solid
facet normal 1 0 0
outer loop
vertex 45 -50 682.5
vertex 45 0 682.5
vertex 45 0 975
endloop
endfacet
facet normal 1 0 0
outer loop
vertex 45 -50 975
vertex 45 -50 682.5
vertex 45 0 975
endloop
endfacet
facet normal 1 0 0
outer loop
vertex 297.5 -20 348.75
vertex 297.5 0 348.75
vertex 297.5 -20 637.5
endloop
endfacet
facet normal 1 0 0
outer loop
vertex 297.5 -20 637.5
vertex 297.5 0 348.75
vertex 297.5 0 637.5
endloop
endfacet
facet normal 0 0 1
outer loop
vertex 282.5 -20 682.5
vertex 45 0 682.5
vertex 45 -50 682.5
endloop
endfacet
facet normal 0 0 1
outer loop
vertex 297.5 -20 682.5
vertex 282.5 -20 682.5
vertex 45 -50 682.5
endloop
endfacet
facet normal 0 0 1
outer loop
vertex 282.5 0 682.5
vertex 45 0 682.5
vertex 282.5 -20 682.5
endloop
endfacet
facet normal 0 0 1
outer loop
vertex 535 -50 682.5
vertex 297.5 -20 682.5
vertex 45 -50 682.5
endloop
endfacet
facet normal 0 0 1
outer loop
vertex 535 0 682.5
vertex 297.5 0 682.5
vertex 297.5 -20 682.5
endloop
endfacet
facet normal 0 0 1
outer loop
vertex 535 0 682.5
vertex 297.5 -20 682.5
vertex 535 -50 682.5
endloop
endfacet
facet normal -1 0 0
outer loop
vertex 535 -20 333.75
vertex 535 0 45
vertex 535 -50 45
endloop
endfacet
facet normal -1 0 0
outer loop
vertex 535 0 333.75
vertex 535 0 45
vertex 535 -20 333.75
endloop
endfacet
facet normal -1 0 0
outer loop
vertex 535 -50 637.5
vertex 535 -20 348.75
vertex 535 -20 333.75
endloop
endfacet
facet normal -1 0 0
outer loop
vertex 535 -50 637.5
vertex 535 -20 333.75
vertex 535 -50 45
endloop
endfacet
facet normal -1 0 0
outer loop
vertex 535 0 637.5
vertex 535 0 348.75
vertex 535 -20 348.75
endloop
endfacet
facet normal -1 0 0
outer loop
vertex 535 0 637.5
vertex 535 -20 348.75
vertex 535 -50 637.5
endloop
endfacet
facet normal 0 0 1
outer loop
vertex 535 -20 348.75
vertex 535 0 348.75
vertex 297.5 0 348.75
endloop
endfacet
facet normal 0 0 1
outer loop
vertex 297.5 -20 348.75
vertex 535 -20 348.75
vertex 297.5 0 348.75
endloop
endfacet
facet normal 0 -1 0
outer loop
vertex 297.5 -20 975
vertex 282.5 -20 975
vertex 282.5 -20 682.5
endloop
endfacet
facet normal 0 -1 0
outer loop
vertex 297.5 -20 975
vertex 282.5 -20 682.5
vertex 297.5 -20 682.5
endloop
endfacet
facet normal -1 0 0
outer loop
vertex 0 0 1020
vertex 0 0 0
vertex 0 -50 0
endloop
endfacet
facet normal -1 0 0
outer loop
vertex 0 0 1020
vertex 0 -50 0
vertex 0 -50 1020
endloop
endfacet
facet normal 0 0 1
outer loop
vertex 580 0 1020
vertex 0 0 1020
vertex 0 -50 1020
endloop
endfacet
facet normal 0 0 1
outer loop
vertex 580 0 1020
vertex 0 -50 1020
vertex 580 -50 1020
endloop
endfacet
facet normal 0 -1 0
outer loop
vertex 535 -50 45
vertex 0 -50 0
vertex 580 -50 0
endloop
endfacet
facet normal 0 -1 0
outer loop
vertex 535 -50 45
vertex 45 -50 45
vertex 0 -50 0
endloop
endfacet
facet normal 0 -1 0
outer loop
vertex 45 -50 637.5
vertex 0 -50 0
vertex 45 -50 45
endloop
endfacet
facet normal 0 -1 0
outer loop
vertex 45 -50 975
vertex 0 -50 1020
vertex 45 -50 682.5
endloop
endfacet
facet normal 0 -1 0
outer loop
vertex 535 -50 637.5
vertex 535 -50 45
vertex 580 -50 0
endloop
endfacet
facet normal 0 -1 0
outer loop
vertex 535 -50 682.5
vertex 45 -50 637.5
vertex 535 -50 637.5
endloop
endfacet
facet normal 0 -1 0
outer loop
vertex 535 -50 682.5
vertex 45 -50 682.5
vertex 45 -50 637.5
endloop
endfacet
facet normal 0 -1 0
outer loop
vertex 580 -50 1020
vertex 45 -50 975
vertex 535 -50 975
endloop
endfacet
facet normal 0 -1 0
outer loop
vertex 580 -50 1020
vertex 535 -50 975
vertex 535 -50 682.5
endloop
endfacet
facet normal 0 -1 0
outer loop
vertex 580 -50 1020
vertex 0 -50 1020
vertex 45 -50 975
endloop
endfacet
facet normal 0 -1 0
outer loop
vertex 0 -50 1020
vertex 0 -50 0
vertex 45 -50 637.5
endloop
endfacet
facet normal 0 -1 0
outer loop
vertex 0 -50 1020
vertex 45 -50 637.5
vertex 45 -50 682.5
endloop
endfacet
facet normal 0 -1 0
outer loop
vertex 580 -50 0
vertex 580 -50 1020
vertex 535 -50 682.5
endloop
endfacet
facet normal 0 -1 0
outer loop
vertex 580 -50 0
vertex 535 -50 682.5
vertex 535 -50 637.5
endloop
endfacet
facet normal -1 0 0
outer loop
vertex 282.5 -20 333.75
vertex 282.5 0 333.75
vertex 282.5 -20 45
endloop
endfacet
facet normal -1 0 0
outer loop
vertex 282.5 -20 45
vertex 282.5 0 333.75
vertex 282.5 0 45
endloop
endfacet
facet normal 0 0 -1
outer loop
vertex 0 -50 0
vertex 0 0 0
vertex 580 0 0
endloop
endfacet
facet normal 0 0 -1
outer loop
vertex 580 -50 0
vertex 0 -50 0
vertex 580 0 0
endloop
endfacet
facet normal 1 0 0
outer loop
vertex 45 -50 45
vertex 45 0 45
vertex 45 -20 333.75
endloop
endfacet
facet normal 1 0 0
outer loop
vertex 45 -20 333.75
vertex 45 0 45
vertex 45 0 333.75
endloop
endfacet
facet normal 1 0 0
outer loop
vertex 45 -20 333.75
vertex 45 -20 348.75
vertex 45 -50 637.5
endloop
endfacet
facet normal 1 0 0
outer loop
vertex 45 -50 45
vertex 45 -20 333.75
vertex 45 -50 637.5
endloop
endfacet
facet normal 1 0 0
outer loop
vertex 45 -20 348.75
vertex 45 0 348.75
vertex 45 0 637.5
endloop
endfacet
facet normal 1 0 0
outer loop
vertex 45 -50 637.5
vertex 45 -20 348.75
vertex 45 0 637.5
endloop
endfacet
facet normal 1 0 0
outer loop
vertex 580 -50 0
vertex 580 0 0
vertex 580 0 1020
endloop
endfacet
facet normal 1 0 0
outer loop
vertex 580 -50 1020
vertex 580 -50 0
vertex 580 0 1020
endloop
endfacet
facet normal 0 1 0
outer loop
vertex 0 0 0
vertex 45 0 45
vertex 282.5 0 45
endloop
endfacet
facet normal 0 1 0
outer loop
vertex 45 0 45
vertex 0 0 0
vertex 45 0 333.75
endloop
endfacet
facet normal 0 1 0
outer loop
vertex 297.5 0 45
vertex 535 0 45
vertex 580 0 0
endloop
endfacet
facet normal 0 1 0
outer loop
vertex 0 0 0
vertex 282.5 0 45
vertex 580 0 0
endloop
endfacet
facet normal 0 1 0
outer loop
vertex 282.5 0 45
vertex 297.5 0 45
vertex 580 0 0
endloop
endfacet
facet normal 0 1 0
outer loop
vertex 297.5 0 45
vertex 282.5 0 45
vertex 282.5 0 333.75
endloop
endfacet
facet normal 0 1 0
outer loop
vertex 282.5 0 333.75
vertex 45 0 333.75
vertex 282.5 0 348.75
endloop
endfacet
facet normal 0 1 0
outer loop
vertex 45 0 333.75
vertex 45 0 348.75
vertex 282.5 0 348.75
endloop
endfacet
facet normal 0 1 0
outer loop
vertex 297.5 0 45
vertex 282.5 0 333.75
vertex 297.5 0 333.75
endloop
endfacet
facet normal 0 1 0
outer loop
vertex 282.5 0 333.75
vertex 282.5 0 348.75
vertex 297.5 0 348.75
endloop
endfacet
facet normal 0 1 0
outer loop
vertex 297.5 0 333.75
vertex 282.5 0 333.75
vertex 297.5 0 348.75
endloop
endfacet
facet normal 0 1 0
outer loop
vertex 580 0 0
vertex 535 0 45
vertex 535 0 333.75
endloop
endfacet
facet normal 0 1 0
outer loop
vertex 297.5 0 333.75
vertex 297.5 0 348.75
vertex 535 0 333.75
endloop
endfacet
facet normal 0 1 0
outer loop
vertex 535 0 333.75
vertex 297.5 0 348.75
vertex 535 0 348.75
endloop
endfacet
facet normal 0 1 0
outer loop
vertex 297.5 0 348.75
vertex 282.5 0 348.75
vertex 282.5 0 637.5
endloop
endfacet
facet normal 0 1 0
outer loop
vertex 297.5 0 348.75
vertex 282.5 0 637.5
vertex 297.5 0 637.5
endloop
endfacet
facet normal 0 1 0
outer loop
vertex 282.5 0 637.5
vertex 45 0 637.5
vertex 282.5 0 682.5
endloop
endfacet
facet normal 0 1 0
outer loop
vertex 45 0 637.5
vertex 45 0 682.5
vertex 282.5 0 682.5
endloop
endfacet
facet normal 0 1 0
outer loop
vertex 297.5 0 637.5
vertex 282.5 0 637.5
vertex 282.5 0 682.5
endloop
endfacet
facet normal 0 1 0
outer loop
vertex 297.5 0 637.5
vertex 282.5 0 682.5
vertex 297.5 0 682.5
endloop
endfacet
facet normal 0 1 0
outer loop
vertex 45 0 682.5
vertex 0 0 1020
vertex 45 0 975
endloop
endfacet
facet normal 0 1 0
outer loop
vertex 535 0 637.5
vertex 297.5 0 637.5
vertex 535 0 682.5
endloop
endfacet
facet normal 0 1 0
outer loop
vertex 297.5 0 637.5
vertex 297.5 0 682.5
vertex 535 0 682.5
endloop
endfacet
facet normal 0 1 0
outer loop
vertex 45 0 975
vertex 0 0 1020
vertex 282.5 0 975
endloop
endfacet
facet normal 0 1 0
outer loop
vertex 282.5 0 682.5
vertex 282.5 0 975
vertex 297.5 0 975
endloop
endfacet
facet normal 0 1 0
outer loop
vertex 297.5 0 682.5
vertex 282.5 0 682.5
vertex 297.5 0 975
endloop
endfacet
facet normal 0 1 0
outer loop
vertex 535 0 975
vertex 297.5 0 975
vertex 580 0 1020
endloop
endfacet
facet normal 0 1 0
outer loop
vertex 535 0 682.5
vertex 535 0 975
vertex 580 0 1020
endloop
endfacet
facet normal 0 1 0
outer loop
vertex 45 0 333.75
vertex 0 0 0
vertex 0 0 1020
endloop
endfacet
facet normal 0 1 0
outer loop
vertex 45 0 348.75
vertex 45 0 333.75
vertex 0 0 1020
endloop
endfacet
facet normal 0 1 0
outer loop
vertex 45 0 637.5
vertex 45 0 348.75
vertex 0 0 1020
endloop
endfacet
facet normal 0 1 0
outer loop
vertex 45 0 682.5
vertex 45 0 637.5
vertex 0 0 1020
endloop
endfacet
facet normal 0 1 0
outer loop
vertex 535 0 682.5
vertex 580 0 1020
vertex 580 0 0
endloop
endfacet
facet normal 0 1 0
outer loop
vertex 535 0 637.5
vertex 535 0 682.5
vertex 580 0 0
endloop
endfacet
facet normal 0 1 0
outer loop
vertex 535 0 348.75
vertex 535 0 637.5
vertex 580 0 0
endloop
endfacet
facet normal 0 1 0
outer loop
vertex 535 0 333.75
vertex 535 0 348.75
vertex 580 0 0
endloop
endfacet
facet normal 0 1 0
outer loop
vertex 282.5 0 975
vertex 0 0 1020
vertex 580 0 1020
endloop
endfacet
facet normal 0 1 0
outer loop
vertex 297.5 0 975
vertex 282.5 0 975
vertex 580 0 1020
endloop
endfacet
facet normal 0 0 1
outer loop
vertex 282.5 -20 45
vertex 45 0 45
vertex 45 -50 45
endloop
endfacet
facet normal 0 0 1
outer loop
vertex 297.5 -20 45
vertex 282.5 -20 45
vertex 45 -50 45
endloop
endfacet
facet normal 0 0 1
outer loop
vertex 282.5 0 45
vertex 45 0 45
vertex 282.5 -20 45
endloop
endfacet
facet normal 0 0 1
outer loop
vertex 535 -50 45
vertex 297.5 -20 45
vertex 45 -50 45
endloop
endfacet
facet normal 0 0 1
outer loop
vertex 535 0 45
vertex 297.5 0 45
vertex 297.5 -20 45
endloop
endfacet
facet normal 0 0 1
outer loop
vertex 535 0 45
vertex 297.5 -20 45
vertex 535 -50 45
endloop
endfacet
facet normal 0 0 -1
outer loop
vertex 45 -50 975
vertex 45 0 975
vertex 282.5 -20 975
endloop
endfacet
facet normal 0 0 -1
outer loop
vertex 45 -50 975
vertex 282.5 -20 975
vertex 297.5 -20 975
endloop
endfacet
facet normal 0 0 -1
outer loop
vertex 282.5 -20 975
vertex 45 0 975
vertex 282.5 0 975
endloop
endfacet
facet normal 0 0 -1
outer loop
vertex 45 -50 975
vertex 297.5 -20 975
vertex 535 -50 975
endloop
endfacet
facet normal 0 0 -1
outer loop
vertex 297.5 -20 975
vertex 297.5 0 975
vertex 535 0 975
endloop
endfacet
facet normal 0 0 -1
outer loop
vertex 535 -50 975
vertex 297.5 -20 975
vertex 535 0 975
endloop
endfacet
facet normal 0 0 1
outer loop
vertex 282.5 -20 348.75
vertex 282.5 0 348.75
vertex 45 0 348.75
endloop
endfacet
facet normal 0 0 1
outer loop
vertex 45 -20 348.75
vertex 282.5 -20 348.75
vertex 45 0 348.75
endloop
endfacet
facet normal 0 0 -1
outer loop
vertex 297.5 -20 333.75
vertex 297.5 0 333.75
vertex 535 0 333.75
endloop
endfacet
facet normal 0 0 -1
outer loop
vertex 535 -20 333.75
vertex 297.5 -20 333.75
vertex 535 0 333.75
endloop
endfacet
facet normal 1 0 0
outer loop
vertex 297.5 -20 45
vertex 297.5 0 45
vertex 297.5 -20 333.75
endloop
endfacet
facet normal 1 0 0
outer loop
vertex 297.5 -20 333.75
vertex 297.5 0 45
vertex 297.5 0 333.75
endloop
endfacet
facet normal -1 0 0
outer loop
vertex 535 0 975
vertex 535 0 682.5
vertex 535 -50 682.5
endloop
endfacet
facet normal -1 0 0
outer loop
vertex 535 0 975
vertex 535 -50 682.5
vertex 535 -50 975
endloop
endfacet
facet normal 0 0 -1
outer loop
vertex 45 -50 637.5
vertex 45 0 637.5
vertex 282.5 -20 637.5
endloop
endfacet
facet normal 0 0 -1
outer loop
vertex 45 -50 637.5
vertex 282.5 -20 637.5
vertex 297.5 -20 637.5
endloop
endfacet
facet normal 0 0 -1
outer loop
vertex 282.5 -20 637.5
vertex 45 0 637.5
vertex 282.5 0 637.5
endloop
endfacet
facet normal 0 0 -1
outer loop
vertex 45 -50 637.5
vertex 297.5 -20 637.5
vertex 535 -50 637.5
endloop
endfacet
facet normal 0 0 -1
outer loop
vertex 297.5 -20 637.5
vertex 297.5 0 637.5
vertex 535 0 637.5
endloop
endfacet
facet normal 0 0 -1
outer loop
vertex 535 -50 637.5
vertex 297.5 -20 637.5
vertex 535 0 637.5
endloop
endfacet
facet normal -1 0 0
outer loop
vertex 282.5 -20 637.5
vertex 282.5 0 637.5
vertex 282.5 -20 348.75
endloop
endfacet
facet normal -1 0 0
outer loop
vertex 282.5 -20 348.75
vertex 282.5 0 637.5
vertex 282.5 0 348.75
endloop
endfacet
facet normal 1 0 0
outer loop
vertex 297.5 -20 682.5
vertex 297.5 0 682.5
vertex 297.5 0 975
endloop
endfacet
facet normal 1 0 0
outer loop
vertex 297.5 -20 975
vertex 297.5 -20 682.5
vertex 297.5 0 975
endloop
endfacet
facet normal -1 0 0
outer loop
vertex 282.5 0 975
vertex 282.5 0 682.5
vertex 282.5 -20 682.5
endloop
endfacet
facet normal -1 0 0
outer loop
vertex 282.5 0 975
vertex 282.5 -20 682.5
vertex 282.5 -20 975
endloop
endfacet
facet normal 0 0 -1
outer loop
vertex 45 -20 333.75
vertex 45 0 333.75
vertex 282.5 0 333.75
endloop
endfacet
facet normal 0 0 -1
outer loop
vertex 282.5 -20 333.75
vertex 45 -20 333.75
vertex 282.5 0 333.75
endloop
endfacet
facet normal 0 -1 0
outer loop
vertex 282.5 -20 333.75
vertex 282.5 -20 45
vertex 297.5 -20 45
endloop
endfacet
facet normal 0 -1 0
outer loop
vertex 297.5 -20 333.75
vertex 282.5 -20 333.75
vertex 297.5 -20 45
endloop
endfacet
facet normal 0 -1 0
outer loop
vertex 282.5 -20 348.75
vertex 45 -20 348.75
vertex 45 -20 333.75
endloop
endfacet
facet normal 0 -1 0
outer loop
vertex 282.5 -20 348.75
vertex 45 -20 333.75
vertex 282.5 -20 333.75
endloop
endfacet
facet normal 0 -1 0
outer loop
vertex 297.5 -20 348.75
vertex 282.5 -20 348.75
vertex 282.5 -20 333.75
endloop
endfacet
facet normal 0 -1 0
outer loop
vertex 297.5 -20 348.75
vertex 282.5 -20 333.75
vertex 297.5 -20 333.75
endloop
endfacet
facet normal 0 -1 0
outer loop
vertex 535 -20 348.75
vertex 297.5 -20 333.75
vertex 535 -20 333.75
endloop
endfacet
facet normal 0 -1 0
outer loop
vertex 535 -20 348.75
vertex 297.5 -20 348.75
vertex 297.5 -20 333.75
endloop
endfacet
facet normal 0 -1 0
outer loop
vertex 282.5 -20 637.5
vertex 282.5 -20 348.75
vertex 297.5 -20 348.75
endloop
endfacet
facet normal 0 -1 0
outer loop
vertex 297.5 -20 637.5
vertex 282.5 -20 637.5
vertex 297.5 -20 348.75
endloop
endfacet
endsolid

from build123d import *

# Parameters (mm, degrees)
F0_W     = 580
F0_H     = 1020
F0_W_2   = 490
F0_H_2   = 592.5
F0_H_3   = 292.5
F1_DEPTH = 50
F2_W     = 15
F2_H     = 292.5
F3_DEPTH = 20


with BuildPart() as f1:
    # F0 (on Front) → F1 (new body)
    with BuildSketch(Plane.XZ):
        with Locations((290, 510)):
            Rectangle(F0_W, F0_H)
        with Locations((290, 341.25)):
            Rectangle(F0_W_2, F0_H_2, mode=Mode.SUBTRACT)
        with Locations((290, 828.75)):
            Rectangle(F0_W_2, F0_H_3, mode=Mode.SUBTRACT)
    extrude(amount=F1_DEPTH)

    # F2 (on Front) → F3 (join)
    with BuildSketch(Plane.XZ):
        with Locations((290, 828.75)):
            Rectangle(F2_W, F2_H)
        Polygon((297.5, 637.5), (282.5, 637.5), (282.5, 348.75), (45, 348.75), (45, 333.75), (282.5, 333.75), (282.5, 45), (297.5, 45), (297.5, 333.75), (535, 333.75), (535, 348.75), (297.5, 348.75), align=None)
    extrude(amount=F3_DEPTH)


solid = f1.part
